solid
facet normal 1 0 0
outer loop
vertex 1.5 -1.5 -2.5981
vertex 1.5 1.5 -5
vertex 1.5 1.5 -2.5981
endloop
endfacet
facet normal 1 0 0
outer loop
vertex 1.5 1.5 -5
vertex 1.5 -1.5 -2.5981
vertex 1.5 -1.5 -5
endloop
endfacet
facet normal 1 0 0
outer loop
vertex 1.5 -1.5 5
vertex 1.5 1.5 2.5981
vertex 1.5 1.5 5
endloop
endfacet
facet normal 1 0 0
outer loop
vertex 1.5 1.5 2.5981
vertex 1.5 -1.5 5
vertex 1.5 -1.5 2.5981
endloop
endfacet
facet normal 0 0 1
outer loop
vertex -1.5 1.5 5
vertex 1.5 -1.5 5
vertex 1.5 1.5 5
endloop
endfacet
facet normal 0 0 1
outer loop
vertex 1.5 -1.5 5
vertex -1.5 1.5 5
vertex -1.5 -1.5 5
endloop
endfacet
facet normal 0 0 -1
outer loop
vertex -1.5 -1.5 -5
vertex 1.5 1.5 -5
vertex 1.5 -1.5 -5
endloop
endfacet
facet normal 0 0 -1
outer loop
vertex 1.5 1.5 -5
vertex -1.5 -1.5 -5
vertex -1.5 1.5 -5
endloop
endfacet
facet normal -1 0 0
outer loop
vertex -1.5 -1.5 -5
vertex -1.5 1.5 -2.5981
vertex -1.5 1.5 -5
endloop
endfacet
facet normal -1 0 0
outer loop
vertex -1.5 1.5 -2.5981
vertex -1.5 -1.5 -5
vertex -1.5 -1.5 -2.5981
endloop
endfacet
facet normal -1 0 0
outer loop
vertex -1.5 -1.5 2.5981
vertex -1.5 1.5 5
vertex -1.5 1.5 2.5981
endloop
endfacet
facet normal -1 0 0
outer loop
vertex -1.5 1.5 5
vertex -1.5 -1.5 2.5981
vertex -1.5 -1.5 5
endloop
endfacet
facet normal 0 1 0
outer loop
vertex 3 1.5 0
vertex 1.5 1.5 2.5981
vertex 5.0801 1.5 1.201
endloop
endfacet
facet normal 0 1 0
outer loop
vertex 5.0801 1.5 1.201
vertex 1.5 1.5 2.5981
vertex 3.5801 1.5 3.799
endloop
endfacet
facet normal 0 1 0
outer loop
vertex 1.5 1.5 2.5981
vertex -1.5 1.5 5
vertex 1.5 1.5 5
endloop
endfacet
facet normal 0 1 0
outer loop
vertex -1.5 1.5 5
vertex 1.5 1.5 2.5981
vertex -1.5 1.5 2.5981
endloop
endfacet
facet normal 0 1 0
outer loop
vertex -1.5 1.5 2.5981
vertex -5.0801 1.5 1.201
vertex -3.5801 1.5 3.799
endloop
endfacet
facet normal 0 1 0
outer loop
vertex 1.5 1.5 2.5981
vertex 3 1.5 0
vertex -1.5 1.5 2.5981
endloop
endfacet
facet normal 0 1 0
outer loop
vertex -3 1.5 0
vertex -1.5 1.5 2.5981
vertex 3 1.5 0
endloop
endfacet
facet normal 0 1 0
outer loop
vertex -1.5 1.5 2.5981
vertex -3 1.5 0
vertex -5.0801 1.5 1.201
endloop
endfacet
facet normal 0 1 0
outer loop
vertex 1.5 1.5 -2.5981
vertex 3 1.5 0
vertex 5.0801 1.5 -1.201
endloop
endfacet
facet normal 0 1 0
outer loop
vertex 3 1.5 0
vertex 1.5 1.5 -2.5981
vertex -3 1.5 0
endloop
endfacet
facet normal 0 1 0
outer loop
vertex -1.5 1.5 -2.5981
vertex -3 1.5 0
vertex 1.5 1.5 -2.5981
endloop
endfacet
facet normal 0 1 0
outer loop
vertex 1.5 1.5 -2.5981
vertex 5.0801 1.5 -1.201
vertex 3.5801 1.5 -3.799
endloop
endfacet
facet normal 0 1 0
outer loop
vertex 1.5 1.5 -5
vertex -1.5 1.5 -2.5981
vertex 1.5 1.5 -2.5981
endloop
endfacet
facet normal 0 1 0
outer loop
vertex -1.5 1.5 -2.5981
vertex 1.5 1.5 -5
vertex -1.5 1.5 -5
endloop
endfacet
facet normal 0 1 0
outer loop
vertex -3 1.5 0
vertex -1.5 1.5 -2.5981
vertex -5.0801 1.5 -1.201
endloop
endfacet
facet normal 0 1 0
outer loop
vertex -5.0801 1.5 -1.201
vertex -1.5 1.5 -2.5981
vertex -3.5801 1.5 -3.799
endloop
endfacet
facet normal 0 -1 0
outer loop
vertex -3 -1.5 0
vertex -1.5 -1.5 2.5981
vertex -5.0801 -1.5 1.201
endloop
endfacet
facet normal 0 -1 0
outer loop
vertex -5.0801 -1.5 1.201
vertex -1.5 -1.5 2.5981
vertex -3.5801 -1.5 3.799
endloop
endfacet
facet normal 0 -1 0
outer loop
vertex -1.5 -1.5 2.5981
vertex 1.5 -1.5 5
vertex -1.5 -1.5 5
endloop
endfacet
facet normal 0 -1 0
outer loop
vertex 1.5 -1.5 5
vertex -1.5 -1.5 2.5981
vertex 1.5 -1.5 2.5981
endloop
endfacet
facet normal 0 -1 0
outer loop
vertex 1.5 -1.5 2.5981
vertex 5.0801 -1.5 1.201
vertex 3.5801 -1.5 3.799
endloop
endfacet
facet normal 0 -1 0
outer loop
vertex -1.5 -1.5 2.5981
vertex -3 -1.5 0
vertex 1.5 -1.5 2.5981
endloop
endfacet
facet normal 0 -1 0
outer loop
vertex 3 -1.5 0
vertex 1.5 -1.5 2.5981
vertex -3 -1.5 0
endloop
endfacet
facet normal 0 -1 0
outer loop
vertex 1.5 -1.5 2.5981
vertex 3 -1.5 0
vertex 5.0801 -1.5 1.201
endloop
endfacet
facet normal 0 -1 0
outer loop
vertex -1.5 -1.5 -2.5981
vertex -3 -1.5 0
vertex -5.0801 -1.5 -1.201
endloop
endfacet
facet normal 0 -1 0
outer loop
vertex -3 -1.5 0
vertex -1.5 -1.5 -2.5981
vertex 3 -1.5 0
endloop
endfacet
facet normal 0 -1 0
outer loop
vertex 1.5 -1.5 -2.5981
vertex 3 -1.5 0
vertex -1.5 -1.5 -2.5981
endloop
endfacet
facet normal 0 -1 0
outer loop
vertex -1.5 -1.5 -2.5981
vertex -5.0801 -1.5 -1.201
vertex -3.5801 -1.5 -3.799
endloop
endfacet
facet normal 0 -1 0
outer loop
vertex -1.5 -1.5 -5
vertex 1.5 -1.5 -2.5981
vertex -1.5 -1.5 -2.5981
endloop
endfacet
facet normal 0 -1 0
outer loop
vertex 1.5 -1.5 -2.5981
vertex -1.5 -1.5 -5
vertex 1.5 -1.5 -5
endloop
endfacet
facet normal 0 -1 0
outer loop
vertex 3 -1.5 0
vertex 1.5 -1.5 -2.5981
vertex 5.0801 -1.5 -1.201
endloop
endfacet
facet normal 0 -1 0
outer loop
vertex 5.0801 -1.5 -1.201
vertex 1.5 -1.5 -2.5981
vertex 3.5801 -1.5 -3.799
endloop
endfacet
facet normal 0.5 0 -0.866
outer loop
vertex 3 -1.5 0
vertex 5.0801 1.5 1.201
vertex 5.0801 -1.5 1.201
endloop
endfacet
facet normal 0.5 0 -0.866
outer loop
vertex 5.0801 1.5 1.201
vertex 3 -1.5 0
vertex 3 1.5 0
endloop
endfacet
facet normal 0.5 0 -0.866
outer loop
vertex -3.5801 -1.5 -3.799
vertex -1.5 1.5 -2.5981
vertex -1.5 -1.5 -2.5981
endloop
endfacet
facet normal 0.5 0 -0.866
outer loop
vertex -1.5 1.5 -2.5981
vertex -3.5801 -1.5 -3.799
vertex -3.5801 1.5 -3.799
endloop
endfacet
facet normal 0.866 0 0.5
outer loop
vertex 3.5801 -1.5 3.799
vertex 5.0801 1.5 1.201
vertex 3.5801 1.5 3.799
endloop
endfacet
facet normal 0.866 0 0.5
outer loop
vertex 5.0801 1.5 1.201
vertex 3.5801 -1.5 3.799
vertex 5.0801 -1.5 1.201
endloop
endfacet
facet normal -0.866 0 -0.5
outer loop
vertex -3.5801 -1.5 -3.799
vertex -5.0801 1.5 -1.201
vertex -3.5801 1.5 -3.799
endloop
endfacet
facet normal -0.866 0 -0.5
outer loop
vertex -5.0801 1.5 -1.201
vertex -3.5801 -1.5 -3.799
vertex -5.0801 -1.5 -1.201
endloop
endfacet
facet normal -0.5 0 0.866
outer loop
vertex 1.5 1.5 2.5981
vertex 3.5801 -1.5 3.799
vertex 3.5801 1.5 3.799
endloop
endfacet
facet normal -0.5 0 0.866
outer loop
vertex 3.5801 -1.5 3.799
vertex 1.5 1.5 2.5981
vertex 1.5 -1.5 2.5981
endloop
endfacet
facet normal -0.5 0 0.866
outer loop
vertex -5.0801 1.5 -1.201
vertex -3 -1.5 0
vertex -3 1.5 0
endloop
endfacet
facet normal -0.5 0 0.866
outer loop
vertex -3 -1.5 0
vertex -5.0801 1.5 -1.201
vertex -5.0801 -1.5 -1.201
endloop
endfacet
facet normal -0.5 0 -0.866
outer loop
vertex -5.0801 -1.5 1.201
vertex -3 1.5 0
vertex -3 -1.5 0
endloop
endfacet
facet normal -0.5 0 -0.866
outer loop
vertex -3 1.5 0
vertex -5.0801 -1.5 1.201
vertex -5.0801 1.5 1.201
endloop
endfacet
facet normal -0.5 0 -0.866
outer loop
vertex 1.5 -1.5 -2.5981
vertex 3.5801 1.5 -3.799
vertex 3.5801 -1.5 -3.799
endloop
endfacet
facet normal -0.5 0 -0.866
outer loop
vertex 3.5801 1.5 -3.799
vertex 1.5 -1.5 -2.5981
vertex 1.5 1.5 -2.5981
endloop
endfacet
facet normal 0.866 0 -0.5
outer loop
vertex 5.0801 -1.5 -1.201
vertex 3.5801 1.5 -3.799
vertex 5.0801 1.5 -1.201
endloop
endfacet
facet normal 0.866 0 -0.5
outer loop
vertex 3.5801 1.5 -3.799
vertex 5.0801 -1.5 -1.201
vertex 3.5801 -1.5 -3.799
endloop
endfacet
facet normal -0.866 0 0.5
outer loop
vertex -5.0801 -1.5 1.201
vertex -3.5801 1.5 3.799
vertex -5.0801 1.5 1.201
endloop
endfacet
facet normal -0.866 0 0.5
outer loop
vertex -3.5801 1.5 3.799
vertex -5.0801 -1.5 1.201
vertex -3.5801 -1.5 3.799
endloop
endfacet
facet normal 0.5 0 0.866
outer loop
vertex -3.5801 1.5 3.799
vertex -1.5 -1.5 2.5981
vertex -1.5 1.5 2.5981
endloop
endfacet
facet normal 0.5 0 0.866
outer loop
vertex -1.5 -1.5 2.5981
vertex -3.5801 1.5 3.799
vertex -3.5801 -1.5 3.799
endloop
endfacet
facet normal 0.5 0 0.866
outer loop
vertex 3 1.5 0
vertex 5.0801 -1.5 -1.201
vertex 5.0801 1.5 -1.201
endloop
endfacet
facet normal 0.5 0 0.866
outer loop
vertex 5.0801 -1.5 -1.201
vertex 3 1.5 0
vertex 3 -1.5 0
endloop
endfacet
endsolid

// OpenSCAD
// file: canvas.scad
include <config.scad>;

module canvas()
{
    cube([
        material_z,
        material_z,
        10
        ], center=true);
}

canvas();
// file: config.scad
/**
 * Project configuration
 * All measures in millimeters
 */

material_z = 3;

mirror_triangle_x = 10;
mirror_symmetry = 6;
mirror_angle = 360 / mirror_symmetry;
// main file
include <config.scad>;
use <canvas.scad>;

module snowflake()
{
    for (i = [0:mirror_symmetry-1])
    {
        angle = i * mirror_angle;
        rotate([
            0,
            angle,
            0
            ])
        canvas();
    }
}

snowflake();
